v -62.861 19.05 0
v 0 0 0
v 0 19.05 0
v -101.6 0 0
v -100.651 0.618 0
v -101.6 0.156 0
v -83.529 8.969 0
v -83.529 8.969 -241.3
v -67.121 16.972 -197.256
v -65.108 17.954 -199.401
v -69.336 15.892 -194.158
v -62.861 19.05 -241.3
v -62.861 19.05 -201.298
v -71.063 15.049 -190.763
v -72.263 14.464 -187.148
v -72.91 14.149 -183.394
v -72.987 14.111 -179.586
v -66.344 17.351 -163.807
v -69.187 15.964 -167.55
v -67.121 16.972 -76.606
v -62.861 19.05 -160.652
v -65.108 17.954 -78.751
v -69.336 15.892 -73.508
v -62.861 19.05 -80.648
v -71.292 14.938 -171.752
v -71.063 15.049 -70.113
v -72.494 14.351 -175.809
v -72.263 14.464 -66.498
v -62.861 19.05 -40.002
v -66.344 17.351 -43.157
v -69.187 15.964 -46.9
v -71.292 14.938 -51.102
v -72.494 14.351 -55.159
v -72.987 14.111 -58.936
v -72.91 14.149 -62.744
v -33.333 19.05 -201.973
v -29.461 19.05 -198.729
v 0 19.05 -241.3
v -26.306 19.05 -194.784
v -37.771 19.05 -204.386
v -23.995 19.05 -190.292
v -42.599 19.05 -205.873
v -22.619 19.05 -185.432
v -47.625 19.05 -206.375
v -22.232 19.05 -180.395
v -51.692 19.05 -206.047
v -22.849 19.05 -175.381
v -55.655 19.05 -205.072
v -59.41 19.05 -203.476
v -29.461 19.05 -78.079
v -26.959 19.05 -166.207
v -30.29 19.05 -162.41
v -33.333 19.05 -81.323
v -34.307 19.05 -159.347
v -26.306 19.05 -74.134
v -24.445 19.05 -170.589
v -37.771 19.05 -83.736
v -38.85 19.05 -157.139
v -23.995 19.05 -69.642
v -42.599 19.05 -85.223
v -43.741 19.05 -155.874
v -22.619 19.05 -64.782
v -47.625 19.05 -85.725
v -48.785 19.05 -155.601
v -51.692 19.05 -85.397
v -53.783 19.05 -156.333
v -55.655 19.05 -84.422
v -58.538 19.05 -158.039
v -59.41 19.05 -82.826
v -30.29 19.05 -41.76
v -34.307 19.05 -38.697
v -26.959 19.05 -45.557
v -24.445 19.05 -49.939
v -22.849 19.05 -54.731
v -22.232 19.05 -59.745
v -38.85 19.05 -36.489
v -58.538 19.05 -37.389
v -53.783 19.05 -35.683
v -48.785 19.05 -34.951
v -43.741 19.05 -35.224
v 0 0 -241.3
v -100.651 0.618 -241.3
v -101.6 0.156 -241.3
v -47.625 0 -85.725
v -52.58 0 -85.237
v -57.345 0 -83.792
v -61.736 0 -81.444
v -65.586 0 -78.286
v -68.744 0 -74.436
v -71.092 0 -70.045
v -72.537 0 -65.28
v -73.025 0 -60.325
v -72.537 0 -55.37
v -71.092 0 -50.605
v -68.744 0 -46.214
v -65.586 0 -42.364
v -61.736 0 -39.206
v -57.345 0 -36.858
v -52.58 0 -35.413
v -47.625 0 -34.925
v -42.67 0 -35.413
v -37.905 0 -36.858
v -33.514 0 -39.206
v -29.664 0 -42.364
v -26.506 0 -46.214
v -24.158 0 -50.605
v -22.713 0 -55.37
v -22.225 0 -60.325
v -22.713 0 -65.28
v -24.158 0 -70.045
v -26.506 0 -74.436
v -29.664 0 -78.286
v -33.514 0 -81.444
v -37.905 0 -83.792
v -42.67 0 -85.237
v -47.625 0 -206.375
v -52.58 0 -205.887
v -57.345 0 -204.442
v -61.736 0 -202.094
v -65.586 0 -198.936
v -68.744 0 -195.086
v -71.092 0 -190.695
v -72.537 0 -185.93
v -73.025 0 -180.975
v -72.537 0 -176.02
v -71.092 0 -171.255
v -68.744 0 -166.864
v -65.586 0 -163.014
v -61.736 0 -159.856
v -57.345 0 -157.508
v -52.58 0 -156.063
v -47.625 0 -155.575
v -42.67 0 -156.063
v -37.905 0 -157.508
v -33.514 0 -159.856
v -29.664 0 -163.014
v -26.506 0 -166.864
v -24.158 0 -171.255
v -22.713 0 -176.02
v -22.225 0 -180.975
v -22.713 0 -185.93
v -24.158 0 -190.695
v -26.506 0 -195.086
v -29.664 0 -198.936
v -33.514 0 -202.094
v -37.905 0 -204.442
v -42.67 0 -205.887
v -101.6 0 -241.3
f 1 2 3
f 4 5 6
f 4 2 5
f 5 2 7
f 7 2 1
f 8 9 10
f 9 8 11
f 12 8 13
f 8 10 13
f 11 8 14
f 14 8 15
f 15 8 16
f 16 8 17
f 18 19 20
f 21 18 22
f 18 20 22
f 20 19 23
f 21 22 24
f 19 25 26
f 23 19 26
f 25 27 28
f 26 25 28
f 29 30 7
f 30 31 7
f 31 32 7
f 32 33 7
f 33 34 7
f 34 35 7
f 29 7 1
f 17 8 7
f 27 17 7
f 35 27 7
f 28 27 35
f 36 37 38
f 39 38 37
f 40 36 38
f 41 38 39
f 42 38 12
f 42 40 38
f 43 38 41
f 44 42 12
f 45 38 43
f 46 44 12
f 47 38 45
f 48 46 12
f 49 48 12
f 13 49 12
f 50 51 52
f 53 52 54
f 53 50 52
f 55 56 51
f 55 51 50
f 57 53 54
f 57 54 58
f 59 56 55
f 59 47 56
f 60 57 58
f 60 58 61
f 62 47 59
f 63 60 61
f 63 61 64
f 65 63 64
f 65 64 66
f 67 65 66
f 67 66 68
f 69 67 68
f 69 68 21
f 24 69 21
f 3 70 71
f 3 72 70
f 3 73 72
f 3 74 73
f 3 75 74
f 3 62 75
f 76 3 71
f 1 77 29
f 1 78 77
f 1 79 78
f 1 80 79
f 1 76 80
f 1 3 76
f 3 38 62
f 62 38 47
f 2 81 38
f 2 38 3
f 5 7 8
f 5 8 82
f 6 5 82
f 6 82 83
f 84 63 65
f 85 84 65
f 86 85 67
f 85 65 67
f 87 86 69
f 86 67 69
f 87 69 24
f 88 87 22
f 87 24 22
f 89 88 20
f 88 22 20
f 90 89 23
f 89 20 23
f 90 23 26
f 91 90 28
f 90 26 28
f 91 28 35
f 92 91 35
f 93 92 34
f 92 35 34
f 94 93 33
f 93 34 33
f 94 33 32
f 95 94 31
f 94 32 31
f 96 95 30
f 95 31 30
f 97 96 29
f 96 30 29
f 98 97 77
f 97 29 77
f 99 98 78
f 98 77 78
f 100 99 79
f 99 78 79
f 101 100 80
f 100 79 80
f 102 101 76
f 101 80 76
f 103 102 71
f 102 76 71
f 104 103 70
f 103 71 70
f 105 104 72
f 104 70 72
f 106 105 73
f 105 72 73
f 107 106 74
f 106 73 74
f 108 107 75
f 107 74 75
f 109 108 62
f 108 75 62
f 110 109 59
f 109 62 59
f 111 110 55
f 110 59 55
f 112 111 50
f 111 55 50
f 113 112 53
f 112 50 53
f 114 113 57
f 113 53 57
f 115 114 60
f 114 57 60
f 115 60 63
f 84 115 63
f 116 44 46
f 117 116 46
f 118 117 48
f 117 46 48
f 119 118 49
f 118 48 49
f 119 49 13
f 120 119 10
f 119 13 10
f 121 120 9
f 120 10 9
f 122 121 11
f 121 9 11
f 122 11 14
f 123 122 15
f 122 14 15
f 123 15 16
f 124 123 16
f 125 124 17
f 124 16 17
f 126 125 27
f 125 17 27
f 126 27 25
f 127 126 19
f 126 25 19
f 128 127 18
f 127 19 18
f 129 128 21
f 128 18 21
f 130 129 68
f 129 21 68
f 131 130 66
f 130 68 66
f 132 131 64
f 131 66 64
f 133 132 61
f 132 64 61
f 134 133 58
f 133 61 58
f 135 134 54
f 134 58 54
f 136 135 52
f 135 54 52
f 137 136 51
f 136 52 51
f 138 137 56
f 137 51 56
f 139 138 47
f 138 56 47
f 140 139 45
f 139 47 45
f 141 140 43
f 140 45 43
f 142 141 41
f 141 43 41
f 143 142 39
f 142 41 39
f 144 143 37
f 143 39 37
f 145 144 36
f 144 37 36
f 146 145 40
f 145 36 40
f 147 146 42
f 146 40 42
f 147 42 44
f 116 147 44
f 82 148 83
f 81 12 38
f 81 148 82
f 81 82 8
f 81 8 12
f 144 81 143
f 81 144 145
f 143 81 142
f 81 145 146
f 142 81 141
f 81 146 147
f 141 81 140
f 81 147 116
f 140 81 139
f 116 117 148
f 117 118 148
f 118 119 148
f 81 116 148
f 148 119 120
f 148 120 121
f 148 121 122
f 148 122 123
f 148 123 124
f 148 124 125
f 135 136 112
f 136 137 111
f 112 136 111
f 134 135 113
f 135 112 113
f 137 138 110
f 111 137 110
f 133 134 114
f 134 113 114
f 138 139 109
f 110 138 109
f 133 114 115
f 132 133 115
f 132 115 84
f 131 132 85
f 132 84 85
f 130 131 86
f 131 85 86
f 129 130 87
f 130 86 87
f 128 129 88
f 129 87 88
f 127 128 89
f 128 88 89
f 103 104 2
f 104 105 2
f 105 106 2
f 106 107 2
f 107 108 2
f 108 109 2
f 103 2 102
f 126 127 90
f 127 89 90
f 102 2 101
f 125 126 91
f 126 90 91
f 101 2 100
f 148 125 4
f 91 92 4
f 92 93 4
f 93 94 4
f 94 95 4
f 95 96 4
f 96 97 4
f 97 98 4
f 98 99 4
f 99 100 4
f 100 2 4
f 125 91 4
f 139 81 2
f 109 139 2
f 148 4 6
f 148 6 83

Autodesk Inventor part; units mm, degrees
ref_plane "YZ Plane" through (0, 0, 0) normal (1, 0, 0) x (0, 1, 0)
ref_plane "XZ Plane" through (0, 0, 0) normal (0, 1, 0) x (-1, 0, 0)
ref_plane "XY Plane" through (0, 0, 0) normal (0, 0, 1) x (1, 0, 0)
sketch "Sketch1" plane through (0, 0, 0) normal (0, 1, 0) x (-1, 0, 0)
  line L0 (0, 0) -> (101.6, 0)
  line L1 (101.6, 0) -> (101.6, -241.3)
  line L2 (101.6, -241.3) -> (0, -241.3)
  line L3 (0, -241.3) -> (0, 0)
  dimension "d0" = 101.6
  dimension "d1" = 241.3
extrude "Extrusion1" add sketch "Sketch1" along normal blind 19.05
hole "Hole1" at (-47.625, 0, -180.975) direction (0, 1, 0) diameter 50.8 end through all
hole "Hole2" at (-47.625, 0, -60.325) direction (0, 1, 0) diameter 50.8 end through all
sketch "Sketch3" plane through (-101.6, 0, 0) normal (0, 0, 1) x (1, 0, 0)
  line L0 (18.0708, 8.9693) -> (0.9487, 0.6183) projected
  line L1 (0.9487, 0.6183) -> (0, 0.1556)
  line L2 (0, 0) -> (0, 19.05) projected
  line L3 (18.0708, 8.9693) -> (38.7393, 19.05)
  line L4 (0, 19.05) -> (101.6, 19.05) projected
  line L5 (38.7393, 19.05) -> (0, 19.05)
  point P0 (101.6, 0)
extrude "Extrusion3" cut sketch "Sketch3" against normal blind 241.3
properties part number "top_slant"
